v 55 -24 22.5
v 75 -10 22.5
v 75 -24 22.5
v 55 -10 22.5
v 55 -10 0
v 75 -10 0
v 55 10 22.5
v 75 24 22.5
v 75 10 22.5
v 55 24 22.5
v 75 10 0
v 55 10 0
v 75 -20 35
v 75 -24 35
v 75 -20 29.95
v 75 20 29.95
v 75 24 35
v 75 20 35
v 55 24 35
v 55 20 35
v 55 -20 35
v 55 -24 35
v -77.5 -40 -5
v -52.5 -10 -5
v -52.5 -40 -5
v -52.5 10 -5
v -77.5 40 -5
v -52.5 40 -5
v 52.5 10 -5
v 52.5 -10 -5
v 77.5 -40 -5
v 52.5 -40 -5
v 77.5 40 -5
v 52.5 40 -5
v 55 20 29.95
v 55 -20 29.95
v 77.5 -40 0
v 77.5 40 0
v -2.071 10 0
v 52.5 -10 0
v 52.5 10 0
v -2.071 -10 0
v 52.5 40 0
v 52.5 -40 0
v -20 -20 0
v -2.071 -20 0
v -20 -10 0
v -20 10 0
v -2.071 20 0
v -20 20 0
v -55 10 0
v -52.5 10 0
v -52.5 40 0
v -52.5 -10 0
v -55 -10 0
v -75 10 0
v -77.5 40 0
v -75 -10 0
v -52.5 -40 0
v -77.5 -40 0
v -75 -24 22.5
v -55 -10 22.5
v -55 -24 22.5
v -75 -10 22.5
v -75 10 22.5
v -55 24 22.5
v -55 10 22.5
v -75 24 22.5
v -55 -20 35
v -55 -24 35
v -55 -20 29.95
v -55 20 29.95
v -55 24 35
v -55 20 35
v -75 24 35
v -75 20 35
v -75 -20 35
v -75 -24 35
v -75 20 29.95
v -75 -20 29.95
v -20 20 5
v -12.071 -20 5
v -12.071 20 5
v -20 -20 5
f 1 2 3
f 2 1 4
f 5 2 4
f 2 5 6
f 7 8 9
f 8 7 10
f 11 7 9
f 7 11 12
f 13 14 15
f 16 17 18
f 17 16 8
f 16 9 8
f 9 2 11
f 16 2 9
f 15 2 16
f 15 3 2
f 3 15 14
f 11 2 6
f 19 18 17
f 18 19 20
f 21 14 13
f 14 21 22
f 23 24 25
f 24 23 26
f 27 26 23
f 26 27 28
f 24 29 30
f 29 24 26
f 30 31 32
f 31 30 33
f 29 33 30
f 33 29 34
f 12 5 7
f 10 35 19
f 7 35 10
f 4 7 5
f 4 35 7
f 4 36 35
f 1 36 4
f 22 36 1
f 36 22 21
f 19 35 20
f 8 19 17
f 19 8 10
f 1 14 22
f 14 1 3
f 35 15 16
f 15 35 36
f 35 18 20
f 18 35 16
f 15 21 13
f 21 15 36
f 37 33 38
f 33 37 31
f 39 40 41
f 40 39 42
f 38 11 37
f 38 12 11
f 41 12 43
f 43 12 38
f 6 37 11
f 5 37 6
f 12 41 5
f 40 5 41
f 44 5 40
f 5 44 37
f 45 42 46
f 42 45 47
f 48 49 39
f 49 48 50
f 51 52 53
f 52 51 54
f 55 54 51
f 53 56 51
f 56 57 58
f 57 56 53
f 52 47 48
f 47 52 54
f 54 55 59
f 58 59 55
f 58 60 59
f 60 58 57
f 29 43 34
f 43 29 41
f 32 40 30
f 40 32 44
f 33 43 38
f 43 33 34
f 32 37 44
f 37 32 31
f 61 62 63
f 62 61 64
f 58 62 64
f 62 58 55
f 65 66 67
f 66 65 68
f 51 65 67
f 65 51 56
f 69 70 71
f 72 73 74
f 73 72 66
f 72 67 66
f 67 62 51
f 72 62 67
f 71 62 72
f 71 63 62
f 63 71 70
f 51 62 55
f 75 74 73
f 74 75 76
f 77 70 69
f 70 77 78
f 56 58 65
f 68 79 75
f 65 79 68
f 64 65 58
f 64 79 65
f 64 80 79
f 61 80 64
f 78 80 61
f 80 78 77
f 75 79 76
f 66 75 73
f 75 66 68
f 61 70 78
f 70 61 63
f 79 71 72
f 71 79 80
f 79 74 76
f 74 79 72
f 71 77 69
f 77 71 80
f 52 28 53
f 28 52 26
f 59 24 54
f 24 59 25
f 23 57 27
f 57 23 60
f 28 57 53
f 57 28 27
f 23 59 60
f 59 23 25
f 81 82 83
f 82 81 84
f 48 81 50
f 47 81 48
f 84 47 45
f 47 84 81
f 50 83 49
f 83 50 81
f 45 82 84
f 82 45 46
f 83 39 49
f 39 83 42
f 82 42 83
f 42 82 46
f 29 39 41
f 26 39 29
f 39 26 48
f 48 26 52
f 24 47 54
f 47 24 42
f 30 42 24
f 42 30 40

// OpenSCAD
// Truck: 345 x 253
// Under bar: 270x40

x = 130;
y = 100;
track= 40;
clearance = 35;
cutout=10;

baseX = 25;
baseY = 2 * track;
t = 5;


union()
{

	color("green")
	translate([0, 0, -t / 2])
		cube([x, track / 2, t], true);
	Support(+x / 2);
	Support(-x / 2);

	color("magenta")
	triangle(track, track, track / 4);
}

module Support(deltaX) {
	translate([deltaX, 0, -t / 2])
		union()
		{
			// Base
			color("blue")
			cube([baseX, baseY, t], true);

			difference()
			{
				// Pillar
				color("green")
				translate([0, 0, clearance / 2])
					cube([track / 2, track * 1.2, clearance + 5], true);

				// Hole where track fits
				color("red")
				translate([0, 0, clearance])
					cube([track, track, 5.1], true);

				// Slim down the pillars
				height = clearance - cutout;
				width = track;
				color("cyan")
				union()
				{
					translate([0, -(width / 2 + cutout), height / 2])
						cube([track, width, height], true);
					translate([0, +(width / 2 + cutout), height / 2])
						cube([track, width, height], true);
				}
			}
		}
}

module triangle(x, y, z)
{
	scale([1.0, 1.0, 0.5])
	translate([0, 0, z / 2])
	difference()
	{
		cube([x, y, z], true);
		rotate([0, 45, 0])
		translate([0, 0, z])
			cube([3 * x, 3 * y, 3 * z], true);
	}
}
